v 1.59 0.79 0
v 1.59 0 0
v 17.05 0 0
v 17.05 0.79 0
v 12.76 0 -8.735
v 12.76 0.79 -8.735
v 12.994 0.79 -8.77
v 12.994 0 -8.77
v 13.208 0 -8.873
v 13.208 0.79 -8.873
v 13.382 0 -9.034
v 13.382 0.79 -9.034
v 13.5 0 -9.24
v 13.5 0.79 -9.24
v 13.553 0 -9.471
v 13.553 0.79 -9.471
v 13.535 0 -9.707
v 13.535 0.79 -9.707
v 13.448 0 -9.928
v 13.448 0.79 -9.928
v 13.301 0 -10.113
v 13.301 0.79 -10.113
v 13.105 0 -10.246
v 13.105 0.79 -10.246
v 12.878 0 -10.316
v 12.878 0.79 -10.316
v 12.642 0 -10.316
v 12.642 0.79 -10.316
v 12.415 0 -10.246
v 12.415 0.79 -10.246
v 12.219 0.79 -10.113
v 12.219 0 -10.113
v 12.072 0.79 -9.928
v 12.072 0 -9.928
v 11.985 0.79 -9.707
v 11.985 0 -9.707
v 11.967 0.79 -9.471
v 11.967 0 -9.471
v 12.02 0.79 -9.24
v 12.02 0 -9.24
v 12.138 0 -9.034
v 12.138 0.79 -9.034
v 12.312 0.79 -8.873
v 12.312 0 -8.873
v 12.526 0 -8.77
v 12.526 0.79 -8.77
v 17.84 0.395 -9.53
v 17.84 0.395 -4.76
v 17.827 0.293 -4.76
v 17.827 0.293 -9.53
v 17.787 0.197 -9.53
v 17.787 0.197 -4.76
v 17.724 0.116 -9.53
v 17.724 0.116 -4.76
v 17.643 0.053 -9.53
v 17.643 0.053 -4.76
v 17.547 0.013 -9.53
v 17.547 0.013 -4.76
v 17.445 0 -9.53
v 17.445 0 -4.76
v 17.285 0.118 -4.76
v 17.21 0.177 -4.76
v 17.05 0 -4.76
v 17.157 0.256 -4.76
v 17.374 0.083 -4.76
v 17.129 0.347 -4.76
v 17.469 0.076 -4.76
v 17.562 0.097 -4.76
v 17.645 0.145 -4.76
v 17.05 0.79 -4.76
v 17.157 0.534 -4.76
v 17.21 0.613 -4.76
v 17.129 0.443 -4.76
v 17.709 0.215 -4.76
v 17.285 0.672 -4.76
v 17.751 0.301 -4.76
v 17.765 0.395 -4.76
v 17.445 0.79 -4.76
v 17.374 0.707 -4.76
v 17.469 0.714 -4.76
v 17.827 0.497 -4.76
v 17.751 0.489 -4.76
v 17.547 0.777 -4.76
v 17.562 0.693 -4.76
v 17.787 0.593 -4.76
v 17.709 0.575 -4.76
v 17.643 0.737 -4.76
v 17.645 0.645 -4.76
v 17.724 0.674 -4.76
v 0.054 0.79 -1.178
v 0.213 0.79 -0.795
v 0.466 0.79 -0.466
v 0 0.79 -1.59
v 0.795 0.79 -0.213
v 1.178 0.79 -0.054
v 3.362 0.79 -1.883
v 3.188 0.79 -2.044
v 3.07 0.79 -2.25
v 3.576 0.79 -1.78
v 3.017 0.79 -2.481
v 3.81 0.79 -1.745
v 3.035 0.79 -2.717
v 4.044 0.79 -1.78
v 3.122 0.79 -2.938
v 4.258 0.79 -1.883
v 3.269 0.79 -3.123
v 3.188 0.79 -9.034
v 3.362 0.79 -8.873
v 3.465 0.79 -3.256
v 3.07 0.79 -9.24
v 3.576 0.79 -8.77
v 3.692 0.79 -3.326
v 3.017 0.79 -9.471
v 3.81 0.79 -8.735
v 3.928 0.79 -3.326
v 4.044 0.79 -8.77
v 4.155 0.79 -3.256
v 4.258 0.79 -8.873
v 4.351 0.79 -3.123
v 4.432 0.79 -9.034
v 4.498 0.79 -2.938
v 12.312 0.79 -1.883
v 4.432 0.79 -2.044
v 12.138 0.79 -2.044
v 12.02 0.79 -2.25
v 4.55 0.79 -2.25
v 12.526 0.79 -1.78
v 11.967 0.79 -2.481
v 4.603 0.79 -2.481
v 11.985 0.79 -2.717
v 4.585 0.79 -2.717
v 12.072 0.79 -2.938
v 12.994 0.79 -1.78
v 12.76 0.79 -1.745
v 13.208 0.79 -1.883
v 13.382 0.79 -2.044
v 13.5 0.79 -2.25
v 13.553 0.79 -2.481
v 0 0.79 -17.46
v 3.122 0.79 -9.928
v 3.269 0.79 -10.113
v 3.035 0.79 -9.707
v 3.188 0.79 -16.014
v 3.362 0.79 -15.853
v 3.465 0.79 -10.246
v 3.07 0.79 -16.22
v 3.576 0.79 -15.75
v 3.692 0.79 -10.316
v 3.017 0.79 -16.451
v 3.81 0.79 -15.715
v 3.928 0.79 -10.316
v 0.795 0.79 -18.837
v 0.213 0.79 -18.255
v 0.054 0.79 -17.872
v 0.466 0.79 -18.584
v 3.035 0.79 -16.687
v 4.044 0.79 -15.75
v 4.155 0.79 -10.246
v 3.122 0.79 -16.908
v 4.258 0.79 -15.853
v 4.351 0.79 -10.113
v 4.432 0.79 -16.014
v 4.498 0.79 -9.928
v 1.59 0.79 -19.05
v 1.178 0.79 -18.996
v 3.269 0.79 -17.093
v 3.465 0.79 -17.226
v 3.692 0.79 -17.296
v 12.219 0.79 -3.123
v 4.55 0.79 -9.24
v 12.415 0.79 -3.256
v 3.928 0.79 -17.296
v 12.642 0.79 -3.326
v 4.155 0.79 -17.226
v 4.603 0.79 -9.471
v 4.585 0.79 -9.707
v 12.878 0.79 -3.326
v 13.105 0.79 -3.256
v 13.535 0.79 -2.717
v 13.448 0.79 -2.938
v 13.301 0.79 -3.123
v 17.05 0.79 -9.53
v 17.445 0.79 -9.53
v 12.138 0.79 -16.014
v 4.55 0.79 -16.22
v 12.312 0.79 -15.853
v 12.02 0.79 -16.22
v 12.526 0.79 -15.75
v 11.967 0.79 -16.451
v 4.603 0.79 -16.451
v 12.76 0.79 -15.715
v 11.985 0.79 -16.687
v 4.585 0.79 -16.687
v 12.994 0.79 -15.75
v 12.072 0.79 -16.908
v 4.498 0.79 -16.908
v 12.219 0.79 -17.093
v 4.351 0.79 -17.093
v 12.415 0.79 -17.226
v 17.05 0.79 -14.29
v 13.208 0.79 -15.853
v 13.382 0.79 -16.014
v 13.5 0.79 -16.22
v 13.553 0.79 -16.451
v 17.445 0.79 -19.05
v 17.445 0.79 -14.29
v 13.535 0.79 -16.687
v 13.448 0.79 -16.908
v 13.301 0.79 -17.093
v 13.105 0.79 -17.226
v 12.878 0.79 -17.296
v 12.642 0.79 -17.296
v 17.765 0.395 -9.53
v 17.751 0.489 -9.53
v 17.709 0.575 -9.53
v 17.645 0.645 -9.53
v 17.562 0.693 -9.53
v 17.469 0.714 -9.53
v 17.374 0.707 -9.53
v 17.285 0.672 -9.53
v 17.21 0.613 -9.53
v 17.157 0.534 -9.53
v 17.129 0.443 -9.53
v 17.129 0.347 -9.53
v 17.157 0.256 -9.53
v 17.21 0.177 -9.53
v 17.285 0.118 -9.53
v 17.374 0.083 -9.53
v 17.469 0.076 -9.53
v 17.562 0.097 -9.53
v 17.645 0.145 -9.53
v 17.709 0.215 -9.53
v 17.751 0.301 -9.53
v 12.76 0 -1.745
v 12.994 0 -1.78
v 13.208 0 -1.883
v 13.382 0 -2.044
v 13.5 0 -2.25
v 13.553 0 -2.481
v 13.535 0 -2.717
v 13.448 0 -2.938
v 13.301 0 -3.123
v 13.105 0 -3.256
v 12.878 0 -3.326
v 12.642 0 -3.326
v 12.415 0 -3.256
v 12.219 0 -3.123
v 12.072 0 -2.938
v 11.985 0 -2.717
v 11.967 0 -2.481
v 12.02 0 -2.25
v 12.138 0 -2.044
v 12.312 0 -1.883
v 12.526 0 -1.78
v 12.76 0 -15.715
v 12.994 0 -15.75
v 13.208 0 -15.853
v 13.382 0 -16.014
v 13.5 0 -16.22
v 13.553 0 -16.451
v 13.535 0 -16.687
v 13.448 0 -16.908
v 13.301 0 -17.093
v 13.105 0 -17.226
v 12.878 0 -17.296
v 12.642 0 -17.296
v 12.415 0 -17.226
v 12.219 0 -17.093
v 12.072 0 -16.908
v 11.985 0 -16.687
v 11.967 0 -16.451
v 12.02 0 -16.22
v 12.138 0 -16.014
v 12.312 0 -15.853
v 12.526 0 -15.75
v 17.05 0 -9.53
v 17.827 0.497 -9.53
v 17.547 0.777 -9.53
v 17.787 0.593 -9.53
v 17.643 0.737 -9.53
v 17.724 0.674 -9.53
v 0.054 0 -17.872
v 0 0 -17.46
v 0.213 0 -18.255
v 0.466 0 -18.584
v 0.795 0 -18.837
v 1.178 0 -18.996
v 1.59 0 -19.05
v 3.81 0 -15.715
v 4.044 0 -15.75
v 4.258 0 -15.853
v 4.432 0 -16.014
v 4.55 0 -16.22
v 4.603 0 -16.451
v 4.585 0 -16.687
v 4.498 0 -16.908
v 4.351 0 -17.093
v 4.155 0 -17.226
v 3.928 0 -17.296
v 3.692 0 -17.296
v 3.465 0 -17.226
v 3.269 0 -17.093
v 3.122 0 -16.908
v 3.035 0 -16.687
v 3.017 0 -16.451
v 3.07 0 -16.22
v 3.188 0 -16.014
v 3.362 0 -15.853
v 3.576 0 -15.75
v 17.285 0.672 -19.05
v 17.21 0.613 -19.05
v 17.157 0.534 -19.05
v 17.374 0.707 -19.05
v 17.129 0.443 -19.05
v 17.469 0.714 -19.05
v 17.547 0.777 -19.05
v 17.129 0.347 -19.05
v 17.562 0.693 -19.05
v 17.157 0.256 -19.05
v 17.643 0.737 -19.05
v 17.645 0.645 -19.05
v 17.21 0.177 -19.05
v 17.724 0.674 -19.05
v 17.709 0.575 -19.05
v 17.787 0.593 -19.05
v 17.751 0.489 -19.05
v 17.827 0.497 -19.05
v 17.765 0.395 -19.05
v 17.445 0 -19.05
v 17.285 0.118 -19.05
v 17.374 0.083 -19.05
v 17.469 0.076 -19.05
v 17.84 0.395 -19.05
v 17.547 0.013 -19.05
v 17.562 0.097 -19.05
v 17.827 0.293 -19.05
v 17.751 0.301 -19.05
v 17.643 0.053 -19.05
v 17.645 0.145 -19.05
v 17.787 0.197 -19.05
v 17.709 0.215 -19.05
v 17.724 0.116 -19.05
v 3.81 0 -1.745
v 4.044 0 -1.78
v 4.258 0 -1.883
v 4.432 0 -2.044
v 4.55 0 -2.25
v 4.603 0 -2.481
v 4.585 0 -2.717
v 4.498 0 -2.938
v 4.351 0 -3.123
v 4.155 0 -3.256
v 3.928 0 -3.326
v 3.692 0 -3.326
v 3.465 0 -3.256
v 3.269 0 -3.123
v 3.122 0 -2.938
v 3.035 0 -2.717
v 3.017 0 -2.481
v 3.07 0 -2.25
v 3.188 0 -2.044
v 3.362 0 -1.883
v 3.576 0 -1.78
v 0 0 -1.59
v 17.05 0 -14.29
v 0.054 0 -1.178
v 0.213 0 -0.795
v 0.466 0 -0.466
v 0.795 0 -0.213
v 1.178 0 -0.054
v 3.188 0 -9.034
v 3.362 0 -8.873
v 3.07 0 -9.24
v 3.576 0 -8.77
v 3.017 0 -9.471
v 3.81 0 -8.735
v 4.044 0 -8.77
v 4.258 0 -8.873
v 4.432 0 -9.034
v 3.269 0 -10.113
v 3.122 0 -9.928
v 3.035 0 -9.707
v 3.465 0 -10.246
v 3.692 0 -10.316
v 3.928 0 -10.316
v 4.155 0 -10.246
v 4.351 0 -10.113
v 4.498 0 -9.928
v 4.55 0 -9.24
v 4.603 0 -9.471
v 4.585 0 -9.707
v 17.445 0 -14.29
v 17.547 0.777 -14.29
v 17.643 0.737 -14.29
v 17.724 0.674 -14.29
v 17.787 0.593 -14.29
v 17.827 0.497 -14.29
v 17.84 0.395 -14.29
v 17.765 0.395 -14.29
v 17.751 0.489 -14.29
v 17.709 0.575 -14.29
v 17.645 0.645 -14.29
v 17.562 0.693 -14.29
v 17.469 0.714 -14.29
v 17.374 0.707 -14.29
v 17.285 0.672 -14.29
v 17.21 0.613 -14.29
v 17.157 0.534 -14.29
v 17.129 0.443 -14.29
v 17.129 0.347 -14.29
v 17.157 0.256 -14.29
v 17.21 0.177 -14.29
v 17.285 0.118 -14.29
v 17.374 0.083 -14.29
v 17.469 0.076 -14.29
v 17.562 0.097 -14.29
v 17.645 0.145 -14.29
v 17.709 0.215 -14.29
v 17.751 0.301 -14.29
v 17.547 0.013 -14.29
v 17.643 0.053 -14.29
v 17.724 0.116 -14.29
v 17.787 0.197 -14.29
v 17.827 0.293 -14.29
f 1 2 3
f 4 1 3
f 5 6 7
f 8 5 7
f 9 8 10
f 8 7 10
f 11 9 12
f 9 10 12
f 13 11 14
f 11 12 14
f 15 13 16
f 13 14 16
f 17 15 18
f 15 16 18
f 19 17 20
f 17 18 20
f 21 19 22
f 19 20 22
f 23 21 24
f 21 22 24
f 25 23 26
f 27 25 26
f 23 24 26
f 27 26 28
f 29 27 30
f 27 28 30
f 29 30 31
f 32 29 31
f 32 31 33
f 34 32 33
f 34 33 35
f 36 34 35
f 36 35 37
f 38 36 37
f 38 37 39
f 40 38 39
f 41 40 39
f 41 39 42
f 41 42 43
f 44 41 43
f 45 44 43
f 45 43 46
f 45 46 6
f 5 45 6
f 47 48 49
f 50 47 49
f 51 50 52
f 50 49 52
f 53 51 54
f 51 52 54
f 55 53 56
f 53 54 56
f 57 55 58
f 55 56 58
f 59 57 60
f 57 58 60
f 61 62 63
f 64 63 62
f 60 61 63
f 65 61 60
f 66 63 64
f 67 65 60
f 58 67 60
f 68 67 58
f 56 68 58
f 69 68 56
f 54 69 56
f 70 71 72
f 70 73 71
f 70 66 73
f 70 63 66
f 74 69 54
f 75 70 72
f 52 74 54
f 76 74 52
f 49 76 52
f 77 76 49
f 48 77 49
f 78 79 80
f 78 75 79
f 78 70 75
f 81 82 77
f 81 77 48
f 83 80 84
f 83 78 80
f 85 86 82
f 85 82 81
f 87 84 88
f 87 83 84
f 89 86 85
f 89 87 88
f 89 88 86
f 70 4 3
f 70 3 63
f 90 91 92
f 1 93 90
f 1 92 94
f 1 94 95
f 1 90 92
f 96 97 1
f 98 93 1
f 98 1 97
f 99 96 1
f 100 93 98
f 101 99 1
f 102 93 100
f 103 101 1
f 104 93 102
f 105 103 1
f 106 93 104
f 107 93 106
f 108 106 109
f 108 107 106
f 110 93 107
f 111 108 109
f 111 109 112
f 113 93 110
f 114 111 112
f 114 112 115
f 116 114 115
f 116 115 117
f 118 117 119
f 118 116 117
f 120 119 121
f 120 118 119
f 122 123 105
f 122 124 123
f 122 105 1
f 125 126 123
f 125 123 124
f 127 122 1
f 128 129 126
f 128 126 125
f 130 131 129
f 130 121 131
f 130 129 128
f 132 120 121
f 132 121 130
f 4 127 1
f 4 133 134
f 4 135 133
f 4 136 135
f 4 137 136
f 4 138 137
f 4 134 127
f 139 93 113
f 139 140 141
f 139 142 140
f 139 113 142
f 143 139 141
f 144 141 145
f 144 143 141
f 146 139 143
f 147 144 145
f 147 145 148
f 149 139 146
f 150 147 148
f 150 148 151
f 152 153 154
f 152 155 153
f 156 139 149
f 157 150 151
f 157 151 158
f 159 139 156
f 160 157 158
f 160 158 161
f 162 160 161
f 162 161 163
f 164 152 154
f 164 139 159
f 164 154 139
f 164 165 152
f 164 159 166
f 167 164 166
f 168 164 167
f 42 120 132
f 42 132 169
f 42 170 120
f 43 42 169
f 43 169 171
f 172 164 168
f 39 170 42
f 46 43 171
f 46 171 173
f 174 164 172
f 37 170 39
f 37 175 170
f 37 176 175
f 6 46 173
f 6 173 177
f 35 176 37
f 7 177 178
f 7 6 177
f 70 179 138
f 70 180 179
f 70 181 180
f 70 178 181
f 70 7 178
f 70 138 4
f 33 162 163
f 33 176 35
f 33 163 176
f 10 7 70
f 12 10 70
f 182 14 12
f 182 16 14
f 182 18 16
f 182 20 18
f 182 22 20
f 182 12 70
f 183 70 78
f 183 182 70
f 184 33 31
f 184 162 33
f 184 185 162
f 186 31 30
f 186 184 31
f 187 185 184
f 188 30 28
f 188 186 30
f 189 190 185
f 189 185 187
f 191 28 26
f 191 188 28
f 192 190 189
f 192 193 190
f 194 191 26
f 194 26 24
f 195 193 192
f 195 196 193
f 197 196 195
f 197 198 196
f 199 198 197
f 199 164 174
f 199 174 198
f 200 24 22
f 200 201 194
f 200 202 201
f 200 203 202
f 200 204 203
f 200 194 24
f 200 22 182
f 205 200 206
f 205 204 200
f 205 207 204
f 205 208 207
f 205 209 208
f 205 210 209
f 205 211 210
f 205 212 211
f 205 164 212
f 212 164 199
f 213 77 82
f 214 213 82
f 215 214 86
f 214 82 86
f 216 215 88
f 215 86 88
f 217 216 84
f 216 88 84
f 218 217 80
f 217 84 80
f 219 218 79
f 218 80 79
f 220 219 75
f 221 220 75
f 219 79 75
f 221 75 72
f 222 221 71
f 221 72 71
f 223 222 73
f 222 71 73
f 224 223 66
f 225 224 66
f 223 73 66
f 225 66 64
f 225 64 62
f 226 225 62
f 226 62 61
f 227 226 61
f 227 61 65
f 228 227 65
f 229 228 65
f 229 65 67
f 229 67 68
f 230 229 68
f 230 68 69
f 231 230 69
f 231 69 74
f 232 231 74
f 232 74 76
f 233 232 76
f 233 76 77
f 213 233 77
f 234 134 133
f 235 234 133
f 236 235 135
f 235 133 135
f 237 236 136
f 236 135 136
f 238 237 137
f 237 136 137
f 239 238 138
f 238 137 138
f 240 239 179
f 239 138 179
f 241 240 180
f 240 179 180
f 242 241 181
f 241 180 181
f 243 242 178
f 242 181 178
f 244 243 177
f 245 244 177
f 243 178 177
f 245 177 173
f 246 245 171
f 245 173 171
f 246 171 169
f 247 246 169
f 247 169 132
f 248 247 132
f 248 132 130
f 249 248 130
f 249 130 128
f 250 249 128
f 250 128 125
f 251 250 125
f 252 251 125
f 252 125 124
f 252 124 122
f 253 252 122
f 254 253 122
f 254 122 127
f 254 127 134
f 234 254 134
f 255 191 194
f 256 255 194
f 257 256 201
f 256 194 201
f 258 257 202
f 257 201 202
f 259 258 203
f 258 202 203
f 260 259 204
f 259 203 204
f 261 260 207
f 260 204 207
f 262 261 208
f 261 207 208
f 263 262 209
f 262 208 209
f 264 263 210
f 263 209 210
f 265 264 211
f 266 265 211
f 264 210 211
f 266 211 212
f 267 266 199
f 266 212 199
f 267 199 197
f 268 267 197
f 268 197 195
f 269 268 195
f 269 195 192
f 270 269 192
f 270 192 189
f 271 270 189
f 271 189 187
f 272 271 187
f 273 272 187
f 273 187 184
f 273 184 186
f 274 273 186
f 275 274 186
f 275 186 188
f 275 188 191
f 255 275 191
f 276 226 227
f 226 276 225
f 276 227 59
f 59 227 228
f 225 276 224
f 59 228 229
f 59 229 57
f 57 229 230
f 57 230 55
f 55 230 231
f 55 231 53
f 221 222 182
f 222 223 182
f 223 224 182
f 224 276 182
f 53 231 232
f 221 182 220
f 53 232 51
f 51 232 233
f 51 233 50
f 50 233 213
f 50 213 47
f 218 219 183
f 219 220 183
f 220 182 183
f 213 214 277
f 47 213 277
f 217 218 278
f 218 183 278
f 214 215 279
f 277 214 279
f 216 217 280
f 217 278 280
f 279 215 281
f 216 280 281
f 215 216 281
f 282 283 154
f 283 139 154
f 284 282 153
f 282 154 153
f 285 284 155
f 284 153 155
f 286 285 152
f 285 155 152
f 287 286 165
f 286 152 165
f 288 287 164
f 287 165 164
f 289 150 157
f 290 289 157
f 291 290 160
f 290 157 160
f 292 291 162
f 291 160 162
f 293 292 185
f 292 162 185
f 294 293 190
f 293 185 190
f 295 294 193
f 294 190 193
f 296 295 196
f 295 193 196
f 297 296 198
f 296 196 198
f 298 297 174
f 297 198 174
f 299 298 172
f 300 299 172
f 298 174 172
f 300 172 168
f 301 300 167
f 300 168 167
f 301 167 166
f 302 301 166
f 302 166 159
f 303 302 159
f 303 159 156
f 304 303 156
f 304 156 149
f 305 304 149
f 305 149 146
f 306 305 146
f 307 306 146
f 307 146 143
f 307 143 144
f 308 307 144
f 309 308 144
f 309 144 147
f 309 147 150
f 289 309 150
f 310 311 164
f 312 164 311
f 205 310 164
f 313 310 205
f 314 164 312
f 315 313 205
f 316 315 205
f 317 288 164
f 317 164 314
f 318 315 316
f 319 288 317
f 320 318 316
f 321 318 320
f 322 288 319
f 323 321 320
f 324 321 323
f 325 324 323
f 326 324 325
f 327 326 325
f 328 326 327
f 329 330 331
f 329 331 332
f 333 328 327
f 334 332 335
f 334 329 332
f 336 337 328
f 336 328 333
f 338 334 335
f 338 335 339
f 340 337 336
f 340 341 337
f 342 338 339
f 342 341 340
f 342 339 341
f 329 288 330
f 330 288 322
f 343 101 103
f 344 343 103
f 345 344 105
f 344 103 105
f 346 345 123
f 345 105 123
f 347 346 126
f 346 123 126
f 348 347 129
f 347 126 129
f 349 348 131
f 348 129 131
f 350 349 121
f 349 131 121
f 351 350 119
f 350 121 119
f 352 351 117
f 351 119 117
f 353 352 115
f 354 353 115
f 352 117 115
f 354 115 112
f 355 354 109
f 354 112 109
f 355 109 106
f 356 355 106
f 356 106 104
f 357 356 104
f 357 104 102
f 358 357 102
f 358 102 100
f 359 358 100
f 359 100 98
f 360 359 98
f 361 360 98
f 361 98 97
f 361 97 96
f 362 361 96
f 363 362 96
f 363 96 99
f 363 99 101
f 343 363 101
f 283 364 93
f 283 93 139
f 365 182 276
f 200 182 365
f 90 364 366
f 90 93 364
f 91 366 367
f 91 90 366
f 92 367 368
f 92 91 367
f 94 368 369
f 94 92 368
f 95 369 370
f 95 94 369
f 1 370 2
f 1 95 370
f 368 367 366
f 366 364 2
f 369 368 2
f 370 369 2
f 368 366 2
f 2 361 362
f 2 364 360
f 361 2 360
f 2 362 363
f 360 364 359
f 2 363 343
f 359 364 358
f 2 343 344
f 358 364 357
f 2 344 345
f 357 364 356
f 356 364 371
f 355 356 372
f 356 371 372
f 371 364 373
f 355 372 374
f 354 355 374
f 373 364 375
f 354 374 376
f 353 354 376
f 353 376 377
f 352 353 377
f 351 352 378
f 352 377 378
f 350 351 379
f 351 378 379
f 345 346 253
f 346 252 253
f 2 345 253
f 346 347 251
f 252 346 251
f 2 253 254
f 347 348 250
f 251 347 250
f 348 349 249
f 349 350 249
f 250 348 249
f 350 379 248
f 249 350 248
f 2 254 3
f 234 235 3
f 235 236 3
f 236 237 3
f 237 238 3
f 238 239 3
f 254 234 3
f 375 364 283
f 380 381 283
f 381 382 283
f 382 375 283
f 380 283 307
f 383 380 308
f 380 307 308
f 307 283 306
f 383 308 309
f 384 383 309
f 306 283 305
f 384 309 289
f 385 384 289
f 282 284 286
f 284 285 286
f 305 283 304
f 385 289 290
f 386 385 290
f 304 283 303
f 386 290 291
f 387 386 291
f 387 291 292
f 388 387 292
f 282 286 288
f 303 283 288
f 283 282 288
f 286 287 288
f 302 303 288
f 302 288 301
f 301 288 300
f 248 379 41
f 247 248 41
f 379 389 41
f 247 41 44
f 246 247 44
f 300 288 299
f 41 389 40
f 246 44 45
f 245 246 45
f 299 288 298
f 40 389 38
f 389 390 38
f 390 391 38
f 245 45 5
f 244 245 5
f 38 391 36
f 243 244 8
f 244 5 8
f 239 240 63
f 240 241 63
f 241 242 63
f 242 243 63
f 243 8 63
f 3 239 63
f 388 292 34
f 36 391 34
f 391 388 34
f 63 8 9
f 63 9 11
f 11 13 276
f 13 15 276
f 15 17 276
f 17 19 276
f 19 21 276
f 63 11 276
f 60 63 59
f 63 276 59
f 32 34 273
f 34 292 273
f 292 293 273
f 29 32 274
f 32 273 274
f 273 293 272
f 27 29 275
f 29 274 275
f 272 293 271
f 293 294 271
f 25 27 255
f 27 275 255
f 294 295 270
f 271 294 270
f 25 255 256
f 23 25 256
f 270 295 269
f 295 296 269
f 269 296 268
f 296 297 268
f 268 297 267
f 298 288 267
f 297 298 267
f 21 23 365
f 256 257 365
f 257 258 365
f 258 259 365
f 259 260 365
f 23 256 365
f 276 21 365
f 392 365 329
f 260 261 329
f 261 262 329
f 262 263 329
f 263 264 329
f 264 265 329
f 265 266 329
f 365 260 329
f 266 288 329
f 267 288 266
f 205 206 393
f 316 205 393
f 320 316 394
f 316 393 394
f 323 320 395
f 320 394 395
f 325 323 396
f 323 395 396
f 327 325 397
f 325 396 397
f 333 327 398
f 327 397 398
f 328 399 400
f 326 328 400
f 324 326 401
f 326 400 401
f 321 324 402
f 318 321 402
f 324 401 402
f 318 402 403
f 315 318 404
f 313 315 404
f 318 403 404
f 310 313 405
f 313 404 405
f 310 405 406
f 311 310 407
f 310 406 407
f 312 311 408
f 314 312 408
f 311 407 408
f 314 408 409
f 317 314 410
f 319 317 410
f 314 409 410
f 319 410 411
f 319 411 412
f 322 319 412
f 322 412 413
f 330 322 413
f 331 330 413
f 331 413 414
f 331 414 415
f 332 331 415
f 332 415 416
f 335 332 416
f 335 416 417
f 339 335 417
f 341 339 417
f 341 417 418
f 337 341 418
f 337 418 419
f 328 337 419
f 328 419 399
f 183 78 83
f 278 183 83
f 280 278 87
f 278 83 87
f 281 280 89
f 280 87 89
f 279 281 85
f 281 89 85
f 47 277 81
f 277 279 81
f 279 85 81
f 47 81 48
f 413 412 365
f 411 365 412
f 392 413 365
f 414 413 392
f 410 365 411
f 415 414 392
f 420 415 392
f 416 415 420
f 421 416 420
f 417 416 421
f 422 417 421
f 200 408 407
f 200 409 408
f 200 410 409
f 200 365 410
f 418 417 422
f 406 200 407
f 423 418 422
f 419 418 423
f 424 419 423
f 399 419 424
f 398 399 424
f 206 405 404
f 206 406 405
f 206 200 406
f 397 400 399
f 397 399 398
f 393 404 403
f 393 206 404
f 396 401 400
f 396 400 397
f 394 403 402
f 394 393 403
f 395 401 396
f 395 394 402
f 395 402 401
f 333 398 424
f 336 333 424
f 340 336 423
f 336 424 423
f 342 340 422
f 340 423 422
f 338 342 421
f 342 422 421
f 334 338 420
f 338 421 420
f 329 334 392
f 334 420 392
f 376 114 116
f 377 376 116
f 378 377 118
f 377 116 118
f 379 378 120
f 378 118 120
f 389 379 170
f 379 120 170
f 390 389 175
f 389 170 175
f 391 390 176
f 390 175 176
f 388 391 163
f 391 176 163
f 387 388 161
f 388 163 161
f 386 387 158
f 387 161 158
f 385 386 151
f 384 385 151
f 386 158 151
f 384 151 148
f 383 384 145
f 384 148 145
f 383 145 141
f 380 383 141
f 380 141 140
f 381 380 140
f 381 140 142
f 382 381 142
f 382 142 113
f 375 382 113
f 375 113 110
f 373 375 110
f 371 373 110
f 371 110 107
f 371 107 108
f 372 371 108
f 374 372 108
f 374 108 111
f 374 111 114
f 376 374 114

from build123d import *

# Parameters (mm, degrees)
SKETCH1_W           = 17.84
SKETCH1_H           = 19.05
BOSS_EXTRUDE1_DEPTH = 0.79
SKETCH2_R           = 0.795
SKETCH2_W           = 0.789999944
SKETCH2_H           = 4.76
CUT_EXTRUDE1_DEPTH  = 2.54
SKETCH4_R           = 0.32
CUT_EXTRUDE2_DEPTH  = 27.111150875
FILLET1_R           = 1.590000122


with BuildPart() as part:
    # Sketch1 → Boss-Extrude1 (new body)
    with BuildSketch(Plane(origin=(0, 0, 0), x_dir=(1, 0, 0), z_dir=(0, 1, 0))):
        with Locations((8.92, 9.525)):
            Rectangle(SKETCH1_W, SKETCH1_H)
    extrude(amount=BOSS_EXTRUDE1_DEPTH)

    # Sketch2 → Cut-Extrude1 (cut)
    with BuildSketch(Plane(origin=(0, 0.79, 0), x_dir=(1, 0, 0), z_dir=(0, 1, 0))):
        with Locations(Location((12.76, 2.54, 0), (0, 0, 270))):
            Circle(SKETCH2_R)
        with Locations(Location((3.81, 2.54, 0), (0, 0, 270))):
            Circle(SKETCH2_R)
        with Locations(Location((3.81, 9.53, 0), (0, 0, 270))):
            Circle(SKETCH2_R)
        with Locations(Location((12.76, 9.53, 0), (0, 0, 270))):
            Circle(SKETCH2_R)
        with Locations(Location((12.76, 16.51, 0), (0, 0, 270))):
            Circle(SKETCH2_R)
        with Locations(Location((3.81, 16.51, 0), (0, 0, 270))):
            Circle(SKETCH2_R)
        with Locations((17.445000028, 11.91)):
            Rectangle(SKETCH2_W, SKETCH2_H)
        with Locations((17.445000028, 2.38)):
            Rectangle(SKETCH2_W, SKETCH2_H)
    extrude(amount=-CUT_EXTRUDE1_DEPTH, mode=Mode.SUBTRACT)

    # Sketch4 → Cut-Extrude2 (cut, through all)
    with BuildSketch(Plane.XY):
        with Locations((17.445000028, 0.395)):
            Circle(SKETCH4_R)
        with BuildLine():
            Line((17.84, 0.79), (17.445000028, 0.79))
            ThreePointArc((17.445000028, 0.79), (17.724307207, 0.674307179), (17.840000028, 0.395))
            Line((17.84, 0.395), (17.84, 0.79))
        make_face()
        with BuildLine():
            ThreePointArc((17.840000028, 0.395), (17.724307207, 0.115692821), (17.445000028, 0))
            Line((17.445000028, 0), (17.84, 0))
            Line((17.84, 0), (17.84, 0.395))
        make_face()
    extrude(amount=-CUT_EXTRUDE2_DEPTH, mode=Mode.SUBTRACT)

    # Fillet1
    fillet1_edges = [part.edges().sort_by_distance(p)[0] for p in [
        (0, 0.395, -19.05),
        (0, 0.395, 0),
    ]]
    fillet(fillet1_edges, radius=FILLET1_R)


solid = part.part
